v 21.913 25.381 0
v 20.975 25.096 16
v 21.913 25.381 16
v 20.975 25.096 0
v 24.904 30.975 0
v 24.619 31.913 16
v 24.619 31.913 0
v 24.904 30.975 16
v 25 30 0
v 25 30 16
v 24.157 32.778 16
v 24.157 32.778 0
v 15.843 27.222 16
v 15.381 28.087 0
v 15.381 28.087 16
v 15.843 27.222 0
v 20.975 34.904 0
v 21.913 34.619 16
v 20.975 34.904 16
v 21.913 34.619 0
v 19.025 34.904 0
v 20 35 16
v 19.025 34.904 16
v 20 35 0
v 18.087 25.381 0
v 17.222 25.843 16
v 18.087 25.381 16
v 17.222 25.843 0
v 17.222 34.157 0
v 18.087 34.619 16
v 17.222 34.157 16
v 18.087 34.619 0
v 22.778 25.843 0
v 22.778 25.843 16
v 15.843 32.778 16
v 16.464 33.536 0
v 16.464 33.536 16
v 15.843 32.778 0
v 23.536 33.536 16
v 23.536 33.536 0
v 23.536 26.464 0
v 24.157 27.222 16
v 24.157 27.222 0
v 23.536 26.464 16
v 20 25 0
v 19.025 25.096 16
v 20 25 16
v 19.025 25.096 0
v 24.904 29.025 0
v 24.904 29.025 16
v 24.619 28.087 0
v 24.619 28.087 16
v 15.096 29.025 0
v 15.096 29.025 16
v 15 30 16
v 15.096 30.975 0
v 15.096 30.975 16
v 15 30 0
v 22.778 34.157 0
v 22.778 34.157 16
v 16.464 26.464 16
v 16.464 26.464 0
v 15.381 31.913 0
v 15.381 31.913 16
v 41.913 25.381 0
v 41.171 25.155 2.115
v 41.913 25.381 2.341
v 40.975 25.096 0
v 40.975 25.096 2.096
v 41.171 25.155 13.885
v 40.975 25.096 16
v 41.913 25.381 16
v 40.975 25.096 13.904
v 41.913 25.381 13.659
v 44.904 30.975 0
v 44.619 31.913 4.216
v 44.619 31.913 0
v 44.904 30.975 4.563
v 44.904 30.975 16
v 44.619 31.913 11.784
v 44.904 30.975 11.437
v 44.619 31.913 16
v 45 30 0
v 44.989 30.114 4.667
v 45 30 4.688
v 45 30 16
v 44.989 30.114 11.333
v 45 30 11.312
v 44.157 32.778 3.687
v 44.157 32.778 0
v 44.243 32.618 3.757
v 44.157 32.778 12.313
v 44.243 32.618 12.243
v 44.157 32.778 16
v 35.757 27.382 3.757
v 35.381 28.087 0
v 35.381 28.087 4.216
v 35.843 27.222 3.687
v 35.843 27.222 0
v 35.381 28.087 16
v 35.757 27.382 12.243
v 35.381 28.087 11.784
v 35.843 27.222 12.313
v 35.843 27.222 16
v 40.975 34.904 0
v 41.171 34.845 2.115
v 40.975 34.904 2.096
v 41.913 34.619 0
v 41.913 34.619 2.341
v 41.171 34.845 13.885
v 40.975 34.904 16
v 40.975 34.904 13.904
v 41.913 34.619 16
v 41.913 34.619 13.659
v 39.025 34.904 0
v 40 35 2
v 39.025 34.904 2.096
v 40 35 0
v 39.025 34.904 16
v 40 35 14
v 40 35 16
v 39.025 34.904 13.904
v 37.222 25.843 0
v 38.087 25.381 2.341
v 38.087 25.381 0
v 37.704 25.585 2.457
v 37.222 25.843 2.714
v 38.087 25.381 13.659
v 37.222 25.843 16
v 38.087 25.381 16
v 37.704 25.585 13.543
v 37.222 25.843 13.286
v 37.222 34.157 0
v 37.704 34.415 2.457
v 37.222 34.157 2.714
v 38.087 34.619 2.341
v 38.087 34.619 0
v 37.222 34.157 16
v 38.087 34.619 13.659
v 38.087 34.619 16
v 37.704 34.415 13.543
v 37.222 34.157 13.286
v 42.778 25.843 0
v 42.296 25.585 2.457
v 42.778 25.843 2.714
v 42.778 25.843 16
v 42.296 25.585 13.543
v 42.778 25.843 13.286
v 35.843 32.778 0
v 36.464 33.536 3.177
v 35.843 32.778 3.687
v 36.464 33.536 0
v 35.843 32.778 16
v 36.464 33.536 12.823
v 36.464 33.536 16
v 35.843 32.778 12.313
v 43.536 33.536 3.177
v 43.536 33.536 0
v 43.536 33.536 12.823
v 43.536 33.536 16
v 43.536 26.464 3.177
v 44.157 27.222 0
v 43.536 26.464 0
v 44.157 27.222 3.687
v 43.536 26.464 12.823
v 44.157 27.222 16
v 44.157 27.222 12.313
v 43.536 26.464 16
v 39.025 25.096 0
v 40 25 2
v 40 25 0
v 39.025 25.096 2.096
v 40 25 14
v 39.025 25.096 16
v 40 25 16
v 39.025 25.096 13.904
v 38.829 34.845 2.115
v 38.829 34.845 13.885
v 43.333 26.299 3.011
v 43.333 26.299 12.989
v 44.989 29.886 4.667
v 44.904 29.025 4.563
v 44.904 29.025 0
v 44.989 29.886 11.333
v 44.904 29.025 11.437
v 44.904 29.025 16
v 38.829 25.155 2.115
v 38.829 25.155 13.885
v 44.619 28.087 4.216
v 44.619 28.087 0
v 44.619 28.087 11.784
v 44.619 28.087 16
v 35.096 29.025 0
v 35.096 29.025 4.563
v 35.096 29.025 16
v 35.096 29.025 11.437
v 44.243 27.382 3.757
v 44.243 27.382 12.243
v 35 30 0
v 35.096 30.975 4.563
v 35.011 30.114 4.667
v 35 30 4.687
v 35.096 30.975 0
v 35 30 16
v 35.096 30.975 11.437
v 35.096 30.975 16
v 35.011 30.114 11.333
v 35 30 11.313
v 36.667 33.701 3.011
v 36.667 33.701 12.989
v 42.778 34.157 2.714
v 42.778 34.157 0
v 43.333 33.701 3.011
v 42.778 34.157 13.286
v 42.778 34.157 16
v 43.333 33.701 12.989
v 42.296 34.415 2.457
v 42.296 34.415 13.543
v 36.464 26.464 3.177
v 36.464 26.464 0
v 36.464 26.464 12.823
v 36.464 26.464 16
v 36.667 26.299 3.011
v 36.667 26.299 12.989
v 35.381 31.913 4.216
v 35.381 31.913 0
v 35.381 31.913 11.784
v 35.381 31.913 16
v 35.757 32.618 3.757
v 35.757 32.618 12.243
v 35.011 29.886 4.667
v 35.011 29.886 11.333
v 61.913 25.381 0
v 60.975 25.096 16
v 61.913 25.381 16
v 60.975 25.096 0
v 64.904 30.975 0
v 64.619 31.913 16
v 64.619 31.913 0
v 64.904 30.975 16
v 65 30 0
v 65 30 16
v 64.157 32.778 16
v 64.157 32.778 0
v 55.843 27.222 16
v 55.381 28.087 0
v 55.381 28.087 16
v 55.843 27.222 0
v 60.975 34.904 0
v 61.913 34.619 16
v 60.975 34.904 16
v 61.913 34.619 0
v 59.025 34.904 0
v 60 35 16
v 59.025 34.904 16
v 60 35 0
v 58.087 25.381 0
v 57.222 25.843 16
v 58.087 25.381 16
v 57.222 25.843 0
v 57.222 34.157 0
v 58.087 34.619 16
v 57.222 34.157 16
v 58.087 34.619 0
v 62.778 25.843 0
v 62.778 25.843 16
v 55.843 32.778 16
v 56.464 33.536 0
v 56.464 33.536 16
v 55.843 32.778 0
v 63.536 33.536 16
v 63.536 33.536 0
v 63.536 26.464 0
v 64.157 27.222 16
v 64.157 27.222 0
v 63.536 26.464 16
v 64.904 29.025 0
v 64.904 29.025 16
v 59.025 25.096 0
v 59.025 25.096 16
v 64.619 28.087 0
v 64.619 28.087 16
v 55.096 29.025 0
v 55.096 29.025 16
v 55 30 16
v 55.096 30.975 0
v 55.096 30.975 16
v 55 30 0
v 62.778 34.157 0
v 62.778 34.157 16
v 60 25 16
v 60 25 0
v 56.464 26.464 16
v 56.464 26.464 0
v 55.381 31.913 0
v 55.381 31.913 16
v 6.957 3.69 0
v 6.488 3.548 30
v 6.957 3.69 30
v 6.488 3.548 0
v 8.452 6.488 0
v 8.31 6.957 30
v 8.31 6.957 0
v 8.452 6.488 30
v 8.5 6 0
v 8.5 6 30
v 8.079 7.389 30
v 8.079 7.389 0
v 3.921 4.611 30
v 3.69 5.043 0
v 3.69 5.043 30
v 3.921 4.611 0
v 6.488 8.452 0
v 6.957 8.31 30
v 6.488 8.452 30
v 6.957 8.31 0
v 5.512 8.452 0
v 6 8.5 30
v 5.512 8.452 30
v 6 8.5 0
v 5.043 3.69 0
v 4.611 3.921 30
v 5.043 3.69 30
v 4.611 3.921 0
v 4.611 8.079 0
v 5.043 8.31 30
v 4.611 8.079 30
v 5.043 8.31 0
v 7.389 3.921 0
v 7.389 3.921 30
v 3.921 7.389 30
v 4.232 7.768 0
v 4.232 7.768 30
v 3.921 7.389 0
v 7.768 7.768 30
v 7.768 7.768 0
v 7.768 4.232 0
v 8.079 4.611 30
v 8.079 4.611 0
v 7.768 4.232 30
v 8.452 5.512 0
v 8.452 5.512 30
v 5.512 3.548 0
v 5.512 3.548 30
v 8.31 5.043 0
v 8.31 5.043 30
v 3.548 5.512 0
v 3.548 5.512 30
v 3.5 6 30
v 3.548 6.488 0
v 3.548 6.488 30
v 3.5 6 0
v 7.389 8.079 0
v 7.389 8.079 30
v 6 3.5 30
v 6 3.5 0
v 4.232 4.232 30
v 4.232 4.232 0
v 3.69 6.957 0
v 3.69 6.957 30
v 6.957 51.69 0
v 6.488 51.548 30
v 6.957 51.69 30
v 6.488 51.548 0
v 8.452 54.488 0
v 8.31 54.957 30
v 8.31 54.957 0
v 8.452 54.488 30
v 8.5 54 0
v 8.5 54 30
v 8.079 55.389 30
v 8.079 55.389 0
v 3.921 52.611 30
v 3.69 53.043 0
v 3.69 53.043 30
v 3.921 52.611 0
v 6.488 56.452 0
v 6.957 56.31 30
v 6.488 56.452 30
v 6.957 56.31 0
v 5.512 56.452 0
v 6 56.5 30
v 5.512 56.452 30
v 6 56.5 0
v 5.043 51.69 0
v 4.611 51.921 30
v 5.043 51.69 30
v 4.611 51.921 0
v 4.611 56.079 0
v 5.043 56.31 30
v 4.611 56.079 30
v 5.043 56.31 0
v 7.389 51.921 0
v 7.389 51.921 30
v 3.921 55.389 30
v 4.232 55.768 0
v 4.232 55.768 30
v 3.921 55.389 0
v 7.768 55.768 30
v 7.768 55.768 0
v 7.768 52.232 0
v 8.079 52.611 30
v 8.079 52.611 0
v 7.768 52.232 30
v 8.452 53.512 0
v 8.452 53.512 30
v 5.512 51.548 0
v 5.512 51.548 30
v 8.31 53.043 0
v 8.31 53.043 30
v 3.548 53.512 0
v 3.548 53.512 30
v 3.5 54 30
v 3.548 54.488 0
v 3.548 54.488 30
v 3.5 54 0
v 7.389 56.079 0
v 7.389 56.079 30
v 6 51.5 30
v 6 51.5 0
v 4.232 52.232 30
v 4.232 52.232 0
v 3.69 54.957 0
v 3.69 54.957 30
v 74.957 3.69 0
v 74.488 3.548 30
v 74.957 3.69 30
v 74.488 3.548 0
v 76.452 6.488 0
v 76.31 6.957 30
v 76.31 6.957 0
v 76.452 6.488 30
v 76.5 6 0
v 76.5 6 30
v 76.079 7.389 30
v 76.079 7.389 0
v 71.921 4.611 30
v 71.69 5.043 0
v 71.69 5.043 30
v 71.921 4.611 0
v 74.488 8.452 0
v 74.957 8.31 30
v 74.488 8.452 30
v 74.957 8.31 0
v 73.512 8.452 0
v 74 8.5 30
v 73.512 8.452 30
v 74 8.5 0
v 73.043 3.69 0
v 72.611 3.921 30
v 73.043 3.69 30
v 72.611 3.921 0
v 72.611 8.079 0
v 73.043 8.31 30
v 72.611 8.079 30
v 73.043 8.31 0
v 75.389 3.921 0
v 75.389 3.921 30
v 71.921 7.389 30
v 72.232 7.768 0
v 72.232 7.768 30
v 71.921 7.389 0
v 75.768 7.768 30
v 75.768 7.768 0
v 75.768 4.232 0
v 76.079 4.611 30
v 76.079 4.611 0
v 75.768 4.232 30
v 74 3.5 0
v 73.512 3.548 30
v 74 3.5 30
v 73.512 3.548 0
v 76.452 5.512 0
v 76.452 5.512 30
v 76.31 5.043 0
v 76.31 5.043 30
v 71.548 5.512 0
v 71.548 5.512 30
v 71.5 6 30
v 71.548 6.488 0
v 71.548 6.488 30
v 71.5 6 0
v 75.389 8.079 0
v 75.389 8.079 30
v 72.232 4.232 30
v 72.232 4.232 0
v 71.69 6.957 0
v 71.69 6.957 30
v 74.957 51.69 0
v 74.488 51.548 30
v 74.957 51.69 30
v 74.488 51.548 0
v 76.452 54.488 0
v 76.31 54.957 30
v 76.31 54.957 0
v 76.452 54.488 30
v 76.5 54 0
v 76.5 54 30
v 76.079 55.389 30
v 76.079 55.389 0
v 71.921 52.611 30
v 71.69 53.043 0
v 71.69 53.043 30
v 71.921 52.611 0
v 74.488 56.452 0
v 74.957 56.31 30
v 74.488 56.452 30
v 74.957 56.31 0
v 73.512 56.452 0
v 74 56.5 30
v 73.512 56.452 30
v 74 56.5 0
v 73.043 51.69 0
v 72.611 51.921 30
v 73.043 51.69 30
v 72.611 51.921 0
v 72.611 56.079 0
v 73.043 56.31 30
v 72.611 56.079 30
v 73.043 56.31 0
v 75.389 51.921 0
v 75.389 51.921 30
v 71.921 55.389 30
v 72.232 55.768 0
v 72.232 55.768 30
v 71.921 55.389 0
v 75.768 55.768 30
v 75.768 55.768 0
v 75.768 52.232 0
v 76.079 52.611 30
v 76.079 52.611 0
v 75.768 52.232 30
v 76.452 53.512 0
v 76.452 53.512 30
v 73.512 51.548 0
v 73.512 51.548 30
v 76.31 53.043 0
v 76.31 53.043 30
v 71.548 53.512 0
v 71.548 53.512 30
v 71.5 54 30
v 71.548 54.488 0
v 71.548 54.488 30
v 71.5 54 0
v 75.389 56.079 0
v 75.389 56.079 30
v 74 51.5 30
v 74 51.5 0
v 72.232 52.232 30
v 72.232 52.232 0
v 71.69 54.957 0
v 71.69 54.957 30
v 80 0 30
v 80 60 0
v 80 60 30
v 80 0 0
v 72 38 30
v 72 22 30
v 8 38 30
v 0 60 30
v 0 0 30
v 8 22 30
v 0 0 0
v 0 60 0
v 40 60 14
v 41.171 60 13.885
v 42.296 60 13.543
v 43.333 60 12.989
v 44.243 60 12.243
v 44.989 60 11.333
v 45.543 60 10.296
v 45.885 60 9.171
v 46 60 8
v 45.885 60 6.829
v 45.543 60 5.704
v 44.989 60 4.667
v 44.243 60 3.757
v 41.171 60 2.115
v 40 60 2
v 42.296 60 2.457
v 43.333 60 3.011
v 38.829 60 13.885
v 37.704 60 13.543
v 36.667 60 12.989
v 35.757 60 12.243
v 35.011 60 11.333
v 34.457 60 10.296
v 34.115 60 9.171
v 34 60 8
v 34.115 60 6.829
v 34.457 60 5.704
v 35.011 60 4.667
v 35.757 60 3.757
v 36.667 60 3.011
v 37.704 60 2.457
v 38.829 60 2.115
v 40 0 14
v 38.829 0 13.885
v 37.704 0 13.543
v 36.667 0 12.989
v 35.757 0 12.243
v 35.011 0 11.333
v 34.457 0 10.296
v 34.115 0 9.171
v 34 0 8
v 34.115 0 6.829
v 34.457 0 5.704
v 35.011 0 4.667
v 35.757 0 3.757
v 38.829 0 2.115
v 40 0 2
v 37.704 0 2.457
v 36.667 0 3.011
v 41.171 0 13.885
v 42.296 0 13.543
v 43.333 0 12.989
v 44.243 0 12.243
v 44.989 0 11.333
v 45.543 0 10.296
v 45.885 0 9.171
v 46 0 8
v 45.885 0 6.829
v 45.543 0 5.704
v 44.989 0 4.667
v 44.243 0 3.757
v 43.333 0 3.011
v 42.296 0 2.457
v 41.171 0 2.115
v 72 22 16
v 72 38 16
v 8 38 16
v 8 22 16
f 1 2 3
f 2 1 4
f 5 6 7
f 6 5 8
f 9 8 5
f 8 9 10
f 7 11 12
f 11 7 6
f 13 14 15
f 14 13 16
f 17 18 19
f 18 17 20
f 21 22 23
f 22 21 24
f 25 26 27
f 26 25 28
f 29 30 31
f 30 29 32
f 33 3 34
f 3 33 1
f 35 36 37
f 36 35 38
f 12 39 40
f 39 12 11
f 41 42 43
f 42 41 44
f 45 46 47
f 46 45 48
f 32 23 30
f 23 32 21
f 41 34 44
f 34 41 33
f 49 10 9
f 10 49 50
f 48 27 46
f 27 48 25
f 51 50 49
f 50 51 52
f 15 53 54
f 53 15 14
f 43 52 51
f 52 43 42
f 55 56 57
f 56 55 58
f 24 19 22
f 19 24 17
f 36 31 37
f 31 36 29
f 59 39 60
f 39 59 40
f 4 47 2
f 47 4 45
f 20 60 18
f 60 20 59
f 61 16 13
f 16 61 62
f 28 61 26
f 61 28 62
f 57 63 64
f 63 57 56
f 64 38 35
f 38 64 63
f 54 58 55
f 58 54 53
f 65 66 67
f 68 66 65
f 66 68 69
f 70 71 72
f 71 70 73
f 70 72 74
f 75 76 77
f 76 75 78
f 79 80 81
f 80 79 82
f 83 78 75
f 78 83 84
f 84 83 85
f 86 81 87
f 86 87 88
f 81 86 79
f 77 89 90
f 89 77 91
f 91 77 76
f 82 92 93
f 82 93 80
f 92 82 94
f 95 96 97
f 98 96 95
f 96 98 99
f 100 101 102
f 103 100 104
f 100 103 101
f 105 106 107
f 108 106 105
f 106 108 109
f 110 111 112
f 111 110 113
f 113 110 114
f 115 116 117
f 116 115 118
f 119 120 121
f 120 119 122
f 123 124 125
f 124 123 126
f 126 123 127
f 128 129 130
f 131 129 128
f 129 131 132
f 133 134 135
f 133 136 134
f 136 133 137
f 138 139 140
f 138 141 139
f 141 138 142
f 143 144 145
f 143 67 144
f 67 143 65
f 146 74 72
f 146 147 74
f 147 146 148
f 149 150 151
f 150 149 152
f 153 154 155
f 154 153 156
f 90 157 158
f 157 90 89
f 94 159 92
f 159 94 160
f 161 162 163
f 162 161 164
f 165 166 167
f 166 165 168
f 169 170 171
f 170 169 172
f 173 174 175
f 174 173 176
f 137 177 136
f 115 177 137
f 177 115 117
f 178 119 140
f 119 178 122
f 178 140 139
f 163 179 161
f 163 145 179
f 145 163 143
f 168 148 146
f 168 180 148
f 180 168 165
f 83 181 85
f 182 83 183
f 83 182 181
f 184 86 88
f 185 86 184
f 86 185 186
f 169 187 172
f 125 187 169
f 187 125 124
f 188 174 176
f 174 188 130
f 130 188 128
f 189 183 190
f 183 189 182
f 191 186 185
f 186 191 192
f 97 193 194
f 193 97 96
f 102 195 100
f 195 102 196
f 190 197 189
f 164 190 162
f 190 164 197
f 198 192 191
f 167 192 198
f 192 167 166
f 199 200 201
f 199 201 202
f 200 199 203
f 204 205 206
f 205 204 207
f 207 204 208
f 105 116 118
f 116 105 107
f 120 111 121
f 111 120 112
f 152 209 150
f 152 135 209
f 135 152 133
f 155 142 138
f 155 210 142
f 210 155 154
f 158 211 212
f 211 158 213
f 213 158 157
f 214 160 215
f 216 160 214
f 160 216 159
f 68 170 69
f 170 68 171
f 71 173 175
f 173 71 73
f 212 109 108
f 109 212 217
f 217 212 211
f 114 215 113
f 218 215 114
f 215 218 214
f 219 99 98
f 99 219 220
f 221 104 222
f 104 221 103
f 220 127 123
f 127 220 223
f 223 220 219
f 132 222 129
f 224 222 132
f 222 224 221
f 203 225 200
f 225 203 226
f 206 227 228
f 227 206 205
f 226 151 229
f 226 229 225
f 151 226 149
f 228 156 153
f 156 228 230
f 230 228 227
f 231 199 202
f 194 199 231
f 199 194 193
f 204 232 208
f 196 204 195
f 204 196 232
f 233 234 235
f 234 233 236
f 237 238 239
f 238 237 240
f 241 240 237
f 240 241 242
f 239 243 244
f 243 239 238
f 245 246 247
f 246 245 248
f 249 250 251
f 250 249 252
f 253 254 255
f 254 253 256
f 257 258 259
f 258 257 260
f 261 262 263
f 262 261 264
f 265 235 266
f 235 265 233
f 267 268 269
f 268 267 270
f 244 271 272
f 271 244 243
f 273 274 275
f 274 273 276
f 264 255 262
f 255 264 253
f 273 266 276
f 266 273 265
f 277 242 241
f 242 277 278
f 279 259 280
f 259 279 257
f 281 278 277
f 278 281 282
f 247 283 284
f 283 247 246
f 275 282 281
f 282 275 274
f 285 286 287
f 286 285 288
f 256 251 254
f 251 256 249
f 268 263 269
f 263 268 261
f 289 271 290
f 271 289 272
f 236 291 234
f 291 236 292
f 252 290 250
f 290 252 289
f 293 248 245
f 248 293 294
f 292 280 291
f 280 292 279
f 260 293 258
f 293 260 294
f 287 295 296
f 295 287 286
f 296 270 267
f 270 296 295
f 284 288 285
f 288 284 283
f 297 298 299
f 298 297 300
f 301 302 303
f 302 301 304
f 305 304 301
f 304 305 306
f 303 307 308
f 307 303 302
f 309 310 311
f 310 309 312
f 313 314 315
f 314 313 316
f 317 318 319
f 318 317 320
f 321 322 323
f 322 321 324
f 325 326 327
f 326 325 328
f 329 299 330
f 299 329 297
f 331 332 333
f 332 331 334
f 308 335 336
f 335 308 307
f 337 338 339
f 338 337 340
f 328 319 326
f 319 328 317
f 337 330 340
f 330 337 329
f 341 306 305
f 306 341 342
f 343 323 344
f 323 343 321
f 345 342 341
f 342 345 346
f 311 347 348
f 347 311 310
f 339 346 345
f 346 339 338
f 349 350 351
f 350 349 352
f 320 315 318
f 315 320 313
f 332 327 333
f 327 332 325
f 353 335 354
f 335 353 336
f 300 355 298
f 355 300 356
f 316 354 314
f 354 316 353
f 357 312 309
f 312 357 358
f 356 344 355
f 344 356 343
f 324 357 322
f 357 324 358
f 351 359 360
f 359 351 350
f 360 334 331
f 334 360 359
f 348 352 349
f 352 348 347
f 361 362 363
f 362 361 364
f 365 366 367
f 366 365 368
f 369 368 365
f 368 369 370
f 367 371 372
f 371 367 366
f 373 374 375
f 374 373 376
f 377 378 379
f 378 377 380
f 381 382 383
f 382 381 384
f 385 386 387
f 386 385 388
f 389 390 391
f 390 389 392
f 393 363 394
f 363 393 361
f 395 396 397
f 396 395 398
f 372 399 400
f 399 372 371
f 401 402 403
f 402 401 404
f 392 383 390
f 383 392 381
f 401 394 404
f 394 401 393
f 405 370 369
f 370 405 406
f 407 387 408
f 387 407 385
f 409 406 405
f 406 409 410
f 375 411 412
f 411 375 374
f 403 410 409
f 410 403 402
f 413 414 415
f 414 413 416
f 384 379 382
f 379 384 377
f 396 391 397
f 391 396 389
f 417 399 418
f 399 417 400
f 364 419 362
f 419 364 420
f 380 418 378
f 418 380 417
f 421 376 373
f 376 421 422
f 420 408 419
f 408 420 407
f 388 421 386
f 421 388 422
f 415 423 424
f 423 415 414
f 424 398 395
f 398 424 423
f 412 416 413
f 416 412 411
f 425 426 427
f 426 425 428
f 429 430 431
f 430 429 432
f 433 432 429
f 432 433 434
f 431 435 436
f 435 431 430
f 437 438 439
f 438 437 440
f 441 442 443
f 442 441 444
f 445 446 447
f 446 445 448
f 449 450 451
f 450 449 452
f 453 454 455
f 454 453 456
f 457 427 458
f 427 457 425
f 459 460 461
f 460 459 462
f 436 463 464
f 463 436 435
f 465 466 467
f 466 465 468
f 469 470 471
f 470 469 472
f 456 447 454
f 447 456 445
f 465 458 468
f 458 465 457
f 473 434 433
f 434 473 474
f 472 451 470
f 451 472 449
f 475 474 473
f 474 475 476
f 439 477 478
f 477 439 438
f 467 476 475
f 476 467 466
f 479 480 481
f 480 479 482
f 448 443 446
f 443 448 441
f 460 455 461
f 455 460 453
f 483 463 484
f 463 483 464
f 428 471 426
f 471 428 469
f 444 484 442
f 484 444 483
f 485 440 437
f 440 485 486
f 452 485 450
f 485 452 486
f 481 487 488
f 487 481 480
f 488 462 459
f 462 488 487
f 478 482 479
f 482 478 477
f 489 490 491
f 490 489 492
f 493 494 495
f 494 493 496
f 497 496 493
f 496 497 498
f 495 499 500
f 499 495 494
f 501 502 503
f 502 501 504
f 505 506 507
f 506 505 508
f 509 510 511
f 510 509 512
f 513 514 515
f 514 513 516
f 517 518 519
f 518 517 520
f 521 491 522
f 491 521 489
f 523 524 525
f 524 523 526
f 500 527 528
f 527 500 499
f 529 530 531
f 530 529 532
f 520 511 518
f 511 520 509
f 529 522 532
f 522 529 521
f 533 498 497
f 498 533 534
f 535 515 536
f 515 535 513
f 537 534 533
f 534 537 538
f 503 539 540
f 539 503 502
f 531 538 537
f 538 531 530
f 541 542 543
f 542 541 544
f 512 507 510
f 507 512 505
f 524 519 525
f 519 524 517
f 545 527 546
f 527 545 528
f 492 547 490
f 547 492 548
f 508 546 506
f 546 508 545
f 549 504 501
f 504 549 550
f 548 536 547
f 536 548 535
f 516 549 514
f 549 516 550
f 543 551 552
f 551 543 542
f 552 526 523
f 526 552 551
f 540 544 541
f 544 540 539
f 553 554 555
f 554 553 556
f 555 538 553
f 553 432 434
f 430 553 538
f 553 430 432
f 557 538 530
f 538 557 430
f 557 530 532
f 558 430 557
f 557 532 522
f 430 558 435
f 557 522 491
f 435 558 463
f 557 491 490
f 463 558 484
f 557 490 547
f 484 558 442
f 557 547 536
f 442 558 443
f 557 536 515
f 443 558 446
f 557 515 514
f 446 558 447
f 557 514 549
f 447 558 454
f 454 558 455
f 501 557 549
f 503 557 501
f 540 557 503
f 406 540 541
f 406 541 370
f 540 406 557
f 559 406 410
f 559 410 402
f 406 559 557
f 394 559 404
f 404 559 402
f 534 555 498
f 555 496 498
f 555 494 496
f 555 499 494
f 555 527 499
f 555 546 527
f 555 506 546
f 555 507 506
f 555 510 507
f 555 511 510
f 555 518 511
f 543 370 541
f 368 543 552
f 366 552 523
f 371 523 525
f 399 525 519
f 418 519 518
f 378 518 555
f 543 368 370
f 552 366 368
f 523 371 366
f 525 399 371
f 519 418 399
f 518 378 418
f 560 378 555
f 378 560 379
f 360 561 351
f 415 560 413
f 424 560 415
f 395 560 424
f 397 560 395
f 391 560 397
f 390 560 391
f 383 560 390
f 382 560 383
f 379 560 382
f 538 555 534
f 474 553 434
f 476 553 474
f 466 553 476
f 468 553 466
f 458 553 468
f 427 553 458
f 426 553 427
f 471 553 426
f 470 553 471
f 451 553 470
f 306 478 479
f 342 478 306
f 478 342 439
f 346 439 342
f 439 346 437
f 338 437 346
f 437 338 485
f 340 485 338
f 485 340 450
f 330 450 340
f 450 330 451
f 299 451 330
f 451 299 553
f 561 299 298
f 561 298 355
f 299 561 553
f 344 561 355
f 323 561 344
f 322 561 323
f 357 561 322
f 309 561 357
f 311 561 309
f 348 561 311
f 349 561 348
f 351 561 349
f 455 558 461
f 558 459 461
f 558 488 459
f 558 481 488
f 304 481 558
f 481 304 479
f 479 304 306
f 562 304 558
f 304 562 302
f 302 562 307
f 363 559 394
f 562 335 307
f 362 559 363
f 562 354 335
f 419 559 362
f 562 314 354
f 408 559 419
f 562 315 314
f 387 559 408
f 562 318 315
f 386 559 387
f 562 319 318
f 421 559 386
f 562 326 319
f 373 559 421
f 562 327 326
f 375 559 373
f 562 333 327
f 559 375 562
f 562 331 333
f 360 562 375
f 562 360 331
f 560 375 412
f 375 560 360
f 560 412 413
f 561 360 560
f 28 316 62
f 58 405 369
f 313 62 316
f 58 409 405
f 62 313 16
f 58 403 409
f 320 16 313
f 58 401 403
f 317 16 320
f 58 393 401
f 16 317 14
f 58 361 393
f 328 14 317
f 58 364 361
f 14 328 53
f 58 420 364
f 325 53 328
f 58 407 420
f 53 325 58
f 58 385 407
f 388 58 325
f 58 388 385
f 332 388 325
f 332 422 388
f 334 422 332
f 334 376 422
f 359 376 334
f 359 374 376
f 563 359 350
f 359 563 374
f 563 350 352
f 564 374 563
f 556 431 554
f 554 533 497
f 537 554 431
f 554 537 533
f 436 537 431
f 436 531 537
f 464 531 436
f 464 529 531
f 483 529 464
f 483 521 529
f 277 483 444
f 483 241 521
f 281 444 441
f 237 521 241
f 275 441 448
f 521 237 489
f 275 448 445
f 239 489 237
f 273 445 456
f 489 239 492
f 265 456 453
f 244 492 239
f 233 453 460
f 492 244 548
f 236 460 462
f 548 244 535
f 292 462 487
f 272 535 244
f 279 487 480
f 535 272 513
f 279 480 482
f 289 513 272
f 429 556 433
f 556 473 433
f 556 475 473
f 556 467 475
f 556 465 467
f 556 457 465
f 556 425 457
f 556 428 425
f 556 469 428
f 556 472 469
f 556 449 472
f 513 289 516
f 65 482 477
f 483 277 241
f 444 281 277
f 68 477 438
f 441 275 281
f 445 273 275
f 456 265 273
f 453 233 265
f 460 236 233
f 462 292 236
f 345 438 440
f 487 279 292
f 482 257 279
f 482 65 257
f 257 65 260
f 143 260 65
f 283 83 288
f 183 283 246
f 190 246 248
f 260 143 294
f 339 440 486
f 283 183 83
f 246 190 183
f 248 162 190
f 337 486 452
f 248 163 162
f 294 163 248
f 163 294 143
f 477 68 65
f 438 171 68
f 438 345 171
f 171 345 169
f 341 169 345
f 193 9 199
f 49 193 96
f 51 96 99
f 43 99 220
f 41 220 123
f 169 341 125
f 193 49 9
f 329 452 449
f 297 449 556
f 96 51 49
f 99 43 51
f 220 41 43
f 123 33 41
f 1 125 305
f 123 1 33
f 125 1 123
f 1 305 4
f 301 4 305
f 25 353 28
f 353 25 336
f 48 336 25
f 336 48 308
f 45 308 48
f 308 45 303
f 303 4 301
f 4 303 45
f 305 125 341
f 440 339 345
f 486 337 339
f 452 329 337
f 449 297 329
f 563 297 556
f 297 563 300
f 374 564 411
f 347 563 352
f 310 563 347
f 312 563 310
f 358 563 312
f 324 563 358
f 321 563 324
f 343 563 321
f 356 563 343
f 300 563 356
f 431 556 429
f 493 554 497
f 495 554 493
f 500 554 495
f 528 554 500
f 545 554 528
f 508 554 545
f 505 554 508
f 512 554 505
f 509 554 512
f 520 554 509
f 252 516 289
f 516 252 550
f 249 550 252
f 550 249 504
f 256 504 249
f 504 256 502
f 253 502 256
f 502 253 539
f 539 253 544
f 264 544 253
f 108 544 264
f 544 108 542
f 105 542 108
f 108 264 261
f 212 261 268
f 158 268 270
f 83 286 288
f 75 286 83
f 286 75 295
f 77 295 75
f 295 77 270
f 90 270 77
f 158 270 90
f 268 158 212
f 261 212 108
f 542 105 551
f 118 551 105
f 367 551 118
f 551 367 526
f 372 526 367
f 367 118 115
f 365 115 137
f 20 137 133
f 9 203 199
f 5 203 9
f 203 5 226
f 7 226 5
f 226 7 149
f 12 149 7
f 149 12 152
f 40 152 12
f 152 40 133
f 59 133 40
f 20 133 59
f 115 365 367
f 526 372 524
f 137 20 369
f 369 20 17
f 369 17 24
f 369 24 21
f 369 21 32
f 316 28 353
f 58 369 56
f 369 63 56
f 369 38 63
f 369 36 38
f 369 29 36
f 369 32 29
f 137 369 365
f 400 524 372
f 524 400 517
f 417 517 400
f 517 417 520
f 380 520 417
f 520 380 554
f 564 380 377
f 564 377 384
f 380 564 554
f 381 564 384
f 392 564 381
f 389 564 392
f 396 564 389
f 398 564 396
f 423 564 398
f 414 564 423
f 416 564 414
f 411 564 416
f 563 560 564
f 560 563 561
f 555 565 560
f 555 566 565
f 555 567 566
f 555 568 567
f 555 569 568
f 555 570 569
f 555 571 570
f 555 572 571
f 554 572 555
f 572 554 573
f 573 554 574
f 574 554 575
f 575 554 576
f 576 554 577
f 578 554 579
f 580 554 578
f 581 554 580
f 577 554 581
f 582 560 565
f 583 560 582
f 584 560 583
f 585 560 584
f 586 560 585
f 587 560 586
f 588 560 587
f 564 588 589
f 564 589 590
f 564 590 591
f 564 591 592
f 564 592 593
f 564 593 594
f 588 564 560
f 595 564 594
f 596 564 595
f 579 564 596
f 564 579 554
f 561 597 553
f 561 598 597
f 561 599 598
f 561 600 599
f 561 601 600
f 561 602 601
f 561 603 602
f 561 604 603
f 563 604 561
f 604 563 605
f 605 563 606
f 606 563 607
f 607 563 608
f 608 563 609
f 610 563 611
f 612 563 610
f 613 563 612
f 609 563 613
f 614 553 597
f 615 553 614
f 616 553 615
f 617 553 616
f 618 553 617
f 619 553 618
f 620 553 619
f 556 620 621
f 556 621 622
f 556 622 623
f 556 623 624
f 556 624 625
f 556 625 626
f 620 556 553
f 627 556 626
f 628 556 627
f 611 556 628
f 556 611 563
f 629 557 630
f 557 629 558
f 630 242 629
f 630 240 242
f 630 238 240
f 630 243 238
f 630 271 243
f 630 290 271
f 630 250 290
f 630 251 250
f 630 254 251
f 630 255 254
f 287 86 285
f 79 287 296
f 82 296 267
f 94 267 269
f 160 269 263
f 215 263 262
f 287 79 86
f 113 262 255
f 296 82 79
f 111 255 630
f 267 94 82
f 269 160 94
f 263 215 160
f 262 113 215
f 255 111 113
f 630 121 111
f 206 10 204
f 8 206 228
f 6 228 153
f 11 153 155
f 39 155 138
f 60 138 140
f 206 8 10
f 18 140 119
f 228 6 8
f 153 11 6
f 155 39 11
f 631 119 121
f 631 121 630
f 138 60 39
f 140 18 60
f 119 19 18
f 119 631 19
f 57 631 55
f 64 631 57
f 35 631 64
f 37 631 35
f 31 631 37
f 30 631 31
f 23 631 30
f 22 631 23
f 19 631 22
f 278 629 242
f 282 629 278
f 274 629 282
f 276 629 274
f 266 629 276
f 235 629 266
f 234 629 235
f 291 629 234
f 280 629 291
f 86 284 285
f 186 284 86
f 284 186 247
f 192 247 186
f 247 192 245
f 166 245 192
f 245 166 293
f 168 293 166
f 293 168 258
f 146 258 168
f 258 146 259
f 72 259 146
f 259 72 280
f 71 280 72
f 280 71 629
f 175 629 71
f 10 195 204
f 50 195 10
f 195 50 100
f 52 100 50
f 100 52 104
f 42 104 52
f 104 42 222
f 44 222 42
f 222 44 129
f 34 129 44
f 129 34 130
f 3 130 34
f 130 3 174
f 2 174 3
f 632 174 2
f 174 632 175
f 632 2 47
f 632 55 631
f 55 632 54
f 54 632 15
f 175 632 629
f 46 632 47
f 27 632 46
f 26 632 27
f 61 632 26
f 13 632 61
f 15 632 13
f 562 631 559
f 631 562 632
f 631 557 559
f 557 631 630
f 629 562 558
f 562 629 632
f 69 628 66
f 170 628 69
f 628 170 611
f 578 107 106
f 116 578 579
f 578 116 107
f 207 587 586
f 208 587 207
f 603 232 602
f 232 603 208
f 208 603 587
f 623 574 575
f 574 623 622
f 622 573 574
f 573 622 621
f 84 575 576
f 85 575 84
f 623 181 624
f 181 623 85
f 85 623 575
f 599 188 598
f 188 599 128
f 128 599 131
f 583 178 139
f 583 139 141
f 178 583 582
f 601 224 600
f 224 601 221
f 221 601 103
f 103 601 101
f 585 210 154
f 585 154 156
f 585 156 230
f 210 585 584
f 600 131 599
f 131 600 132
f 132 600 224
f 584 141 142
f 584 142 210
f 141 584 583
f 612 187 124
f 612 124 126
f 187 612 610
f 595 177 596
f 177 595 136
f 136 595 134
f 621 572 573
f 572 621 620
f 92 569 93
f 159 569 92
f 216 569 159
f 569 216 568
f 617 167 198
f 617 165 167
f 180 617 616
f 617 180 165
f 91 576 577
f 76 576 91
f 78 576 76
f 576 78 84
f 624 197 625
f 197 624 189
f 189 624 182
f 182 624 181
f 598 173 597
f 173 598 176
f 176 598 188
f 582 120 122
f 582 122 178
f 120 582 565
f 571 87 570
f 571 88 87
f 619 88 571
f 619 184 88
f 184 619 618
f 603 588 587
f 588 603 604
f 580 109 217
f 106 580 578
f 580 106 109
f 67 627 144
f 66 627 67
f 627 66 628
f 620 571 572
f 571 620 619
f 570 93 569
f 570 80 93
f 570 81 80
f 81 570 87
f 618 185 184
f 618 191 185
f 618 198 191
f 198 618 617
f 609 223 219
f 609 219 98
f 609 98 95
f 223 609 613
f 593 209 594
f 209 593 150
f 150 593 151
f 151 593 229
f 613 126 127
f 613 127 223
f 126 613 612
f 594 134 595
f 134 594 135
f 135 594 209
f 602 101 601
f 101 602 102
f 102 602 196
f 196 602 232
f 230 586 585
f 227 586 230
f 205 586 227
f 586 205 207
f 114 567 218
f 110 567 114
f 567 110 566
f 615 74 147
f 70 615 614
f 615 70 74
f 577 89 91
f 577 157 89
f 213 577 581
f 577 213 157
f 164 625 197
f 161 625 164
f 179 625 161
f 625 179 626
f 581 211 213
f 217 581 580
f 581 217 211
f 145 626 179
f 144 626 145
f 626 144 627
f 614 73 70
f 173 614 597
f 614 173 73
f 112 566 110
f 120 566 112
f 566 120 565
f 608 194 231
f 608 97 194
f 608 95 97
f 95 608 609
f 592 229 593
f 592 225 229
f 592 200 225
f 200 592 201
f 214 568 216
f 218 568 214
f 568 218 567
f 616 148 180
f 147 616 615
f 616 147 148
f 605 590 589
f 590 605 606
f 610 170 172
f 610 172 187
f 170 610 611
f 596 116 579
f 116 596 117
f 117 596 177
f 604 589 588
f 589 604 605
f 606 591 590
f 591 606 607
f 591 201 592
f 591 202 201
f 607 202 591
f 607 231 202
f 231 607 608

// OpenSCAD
$fn = 32;

// ----------------------------------------------------------------------
// Manifold block: side_outlet manifold
// ----------------------------------------------------------------------

// --- parameters (mm) ---
block_l = 80;             // block length, X
block_w = 60;             // block width, Y
block_h = 30;             // block height, Z
port_d = 10;              // port bore diameter
port_pitch = 20;          // port pitch along X
gallery_d = 16;           // top gallery width, Y
gallery_depth = 14;       // gallery pocket depth
wall_p = 8;               // gallery end wall thickness, X
mnt_d = 5;                // mounting hole diameter
mnt_in = 6;               // mounting hole inset from the edges
out_d = 12;               // outlet bore diameter
out_z = 8;                // outlet axis height

n_ports = 3;  // ports in the row
port_x0 = (block_l - (n_ports - 1) * port_pitch) / 2;  // first port X

difference() {
  cube([block_l, block_w, block_h]);
  for (i = [0 : n_ports - 1])
    translate([port_x0 + i * port_pitch, block_w / 2, -1])
      cylinder(h = block_h + 2, d = port_d);
  translate([wall_p, block_w / 2 - gallery_d / 2, block_h - gallery_depth])
    cube([block_l - 2 * wall_p, gallery_d, gallery_depth + 1]);
  for (cx = [mnt_in, block_l - mnt_in])
    for (cy = [mnt_in, block_w - mnt_in])
      translate([cx, cy, -1]) cylinder(h = block_h + 2, d = mnt_d);
  translate([block_l / 2, -1, out_z]) rotate([-90, 0, 0])
    cylinder(h = block_w + 2, d = out_d);
}
